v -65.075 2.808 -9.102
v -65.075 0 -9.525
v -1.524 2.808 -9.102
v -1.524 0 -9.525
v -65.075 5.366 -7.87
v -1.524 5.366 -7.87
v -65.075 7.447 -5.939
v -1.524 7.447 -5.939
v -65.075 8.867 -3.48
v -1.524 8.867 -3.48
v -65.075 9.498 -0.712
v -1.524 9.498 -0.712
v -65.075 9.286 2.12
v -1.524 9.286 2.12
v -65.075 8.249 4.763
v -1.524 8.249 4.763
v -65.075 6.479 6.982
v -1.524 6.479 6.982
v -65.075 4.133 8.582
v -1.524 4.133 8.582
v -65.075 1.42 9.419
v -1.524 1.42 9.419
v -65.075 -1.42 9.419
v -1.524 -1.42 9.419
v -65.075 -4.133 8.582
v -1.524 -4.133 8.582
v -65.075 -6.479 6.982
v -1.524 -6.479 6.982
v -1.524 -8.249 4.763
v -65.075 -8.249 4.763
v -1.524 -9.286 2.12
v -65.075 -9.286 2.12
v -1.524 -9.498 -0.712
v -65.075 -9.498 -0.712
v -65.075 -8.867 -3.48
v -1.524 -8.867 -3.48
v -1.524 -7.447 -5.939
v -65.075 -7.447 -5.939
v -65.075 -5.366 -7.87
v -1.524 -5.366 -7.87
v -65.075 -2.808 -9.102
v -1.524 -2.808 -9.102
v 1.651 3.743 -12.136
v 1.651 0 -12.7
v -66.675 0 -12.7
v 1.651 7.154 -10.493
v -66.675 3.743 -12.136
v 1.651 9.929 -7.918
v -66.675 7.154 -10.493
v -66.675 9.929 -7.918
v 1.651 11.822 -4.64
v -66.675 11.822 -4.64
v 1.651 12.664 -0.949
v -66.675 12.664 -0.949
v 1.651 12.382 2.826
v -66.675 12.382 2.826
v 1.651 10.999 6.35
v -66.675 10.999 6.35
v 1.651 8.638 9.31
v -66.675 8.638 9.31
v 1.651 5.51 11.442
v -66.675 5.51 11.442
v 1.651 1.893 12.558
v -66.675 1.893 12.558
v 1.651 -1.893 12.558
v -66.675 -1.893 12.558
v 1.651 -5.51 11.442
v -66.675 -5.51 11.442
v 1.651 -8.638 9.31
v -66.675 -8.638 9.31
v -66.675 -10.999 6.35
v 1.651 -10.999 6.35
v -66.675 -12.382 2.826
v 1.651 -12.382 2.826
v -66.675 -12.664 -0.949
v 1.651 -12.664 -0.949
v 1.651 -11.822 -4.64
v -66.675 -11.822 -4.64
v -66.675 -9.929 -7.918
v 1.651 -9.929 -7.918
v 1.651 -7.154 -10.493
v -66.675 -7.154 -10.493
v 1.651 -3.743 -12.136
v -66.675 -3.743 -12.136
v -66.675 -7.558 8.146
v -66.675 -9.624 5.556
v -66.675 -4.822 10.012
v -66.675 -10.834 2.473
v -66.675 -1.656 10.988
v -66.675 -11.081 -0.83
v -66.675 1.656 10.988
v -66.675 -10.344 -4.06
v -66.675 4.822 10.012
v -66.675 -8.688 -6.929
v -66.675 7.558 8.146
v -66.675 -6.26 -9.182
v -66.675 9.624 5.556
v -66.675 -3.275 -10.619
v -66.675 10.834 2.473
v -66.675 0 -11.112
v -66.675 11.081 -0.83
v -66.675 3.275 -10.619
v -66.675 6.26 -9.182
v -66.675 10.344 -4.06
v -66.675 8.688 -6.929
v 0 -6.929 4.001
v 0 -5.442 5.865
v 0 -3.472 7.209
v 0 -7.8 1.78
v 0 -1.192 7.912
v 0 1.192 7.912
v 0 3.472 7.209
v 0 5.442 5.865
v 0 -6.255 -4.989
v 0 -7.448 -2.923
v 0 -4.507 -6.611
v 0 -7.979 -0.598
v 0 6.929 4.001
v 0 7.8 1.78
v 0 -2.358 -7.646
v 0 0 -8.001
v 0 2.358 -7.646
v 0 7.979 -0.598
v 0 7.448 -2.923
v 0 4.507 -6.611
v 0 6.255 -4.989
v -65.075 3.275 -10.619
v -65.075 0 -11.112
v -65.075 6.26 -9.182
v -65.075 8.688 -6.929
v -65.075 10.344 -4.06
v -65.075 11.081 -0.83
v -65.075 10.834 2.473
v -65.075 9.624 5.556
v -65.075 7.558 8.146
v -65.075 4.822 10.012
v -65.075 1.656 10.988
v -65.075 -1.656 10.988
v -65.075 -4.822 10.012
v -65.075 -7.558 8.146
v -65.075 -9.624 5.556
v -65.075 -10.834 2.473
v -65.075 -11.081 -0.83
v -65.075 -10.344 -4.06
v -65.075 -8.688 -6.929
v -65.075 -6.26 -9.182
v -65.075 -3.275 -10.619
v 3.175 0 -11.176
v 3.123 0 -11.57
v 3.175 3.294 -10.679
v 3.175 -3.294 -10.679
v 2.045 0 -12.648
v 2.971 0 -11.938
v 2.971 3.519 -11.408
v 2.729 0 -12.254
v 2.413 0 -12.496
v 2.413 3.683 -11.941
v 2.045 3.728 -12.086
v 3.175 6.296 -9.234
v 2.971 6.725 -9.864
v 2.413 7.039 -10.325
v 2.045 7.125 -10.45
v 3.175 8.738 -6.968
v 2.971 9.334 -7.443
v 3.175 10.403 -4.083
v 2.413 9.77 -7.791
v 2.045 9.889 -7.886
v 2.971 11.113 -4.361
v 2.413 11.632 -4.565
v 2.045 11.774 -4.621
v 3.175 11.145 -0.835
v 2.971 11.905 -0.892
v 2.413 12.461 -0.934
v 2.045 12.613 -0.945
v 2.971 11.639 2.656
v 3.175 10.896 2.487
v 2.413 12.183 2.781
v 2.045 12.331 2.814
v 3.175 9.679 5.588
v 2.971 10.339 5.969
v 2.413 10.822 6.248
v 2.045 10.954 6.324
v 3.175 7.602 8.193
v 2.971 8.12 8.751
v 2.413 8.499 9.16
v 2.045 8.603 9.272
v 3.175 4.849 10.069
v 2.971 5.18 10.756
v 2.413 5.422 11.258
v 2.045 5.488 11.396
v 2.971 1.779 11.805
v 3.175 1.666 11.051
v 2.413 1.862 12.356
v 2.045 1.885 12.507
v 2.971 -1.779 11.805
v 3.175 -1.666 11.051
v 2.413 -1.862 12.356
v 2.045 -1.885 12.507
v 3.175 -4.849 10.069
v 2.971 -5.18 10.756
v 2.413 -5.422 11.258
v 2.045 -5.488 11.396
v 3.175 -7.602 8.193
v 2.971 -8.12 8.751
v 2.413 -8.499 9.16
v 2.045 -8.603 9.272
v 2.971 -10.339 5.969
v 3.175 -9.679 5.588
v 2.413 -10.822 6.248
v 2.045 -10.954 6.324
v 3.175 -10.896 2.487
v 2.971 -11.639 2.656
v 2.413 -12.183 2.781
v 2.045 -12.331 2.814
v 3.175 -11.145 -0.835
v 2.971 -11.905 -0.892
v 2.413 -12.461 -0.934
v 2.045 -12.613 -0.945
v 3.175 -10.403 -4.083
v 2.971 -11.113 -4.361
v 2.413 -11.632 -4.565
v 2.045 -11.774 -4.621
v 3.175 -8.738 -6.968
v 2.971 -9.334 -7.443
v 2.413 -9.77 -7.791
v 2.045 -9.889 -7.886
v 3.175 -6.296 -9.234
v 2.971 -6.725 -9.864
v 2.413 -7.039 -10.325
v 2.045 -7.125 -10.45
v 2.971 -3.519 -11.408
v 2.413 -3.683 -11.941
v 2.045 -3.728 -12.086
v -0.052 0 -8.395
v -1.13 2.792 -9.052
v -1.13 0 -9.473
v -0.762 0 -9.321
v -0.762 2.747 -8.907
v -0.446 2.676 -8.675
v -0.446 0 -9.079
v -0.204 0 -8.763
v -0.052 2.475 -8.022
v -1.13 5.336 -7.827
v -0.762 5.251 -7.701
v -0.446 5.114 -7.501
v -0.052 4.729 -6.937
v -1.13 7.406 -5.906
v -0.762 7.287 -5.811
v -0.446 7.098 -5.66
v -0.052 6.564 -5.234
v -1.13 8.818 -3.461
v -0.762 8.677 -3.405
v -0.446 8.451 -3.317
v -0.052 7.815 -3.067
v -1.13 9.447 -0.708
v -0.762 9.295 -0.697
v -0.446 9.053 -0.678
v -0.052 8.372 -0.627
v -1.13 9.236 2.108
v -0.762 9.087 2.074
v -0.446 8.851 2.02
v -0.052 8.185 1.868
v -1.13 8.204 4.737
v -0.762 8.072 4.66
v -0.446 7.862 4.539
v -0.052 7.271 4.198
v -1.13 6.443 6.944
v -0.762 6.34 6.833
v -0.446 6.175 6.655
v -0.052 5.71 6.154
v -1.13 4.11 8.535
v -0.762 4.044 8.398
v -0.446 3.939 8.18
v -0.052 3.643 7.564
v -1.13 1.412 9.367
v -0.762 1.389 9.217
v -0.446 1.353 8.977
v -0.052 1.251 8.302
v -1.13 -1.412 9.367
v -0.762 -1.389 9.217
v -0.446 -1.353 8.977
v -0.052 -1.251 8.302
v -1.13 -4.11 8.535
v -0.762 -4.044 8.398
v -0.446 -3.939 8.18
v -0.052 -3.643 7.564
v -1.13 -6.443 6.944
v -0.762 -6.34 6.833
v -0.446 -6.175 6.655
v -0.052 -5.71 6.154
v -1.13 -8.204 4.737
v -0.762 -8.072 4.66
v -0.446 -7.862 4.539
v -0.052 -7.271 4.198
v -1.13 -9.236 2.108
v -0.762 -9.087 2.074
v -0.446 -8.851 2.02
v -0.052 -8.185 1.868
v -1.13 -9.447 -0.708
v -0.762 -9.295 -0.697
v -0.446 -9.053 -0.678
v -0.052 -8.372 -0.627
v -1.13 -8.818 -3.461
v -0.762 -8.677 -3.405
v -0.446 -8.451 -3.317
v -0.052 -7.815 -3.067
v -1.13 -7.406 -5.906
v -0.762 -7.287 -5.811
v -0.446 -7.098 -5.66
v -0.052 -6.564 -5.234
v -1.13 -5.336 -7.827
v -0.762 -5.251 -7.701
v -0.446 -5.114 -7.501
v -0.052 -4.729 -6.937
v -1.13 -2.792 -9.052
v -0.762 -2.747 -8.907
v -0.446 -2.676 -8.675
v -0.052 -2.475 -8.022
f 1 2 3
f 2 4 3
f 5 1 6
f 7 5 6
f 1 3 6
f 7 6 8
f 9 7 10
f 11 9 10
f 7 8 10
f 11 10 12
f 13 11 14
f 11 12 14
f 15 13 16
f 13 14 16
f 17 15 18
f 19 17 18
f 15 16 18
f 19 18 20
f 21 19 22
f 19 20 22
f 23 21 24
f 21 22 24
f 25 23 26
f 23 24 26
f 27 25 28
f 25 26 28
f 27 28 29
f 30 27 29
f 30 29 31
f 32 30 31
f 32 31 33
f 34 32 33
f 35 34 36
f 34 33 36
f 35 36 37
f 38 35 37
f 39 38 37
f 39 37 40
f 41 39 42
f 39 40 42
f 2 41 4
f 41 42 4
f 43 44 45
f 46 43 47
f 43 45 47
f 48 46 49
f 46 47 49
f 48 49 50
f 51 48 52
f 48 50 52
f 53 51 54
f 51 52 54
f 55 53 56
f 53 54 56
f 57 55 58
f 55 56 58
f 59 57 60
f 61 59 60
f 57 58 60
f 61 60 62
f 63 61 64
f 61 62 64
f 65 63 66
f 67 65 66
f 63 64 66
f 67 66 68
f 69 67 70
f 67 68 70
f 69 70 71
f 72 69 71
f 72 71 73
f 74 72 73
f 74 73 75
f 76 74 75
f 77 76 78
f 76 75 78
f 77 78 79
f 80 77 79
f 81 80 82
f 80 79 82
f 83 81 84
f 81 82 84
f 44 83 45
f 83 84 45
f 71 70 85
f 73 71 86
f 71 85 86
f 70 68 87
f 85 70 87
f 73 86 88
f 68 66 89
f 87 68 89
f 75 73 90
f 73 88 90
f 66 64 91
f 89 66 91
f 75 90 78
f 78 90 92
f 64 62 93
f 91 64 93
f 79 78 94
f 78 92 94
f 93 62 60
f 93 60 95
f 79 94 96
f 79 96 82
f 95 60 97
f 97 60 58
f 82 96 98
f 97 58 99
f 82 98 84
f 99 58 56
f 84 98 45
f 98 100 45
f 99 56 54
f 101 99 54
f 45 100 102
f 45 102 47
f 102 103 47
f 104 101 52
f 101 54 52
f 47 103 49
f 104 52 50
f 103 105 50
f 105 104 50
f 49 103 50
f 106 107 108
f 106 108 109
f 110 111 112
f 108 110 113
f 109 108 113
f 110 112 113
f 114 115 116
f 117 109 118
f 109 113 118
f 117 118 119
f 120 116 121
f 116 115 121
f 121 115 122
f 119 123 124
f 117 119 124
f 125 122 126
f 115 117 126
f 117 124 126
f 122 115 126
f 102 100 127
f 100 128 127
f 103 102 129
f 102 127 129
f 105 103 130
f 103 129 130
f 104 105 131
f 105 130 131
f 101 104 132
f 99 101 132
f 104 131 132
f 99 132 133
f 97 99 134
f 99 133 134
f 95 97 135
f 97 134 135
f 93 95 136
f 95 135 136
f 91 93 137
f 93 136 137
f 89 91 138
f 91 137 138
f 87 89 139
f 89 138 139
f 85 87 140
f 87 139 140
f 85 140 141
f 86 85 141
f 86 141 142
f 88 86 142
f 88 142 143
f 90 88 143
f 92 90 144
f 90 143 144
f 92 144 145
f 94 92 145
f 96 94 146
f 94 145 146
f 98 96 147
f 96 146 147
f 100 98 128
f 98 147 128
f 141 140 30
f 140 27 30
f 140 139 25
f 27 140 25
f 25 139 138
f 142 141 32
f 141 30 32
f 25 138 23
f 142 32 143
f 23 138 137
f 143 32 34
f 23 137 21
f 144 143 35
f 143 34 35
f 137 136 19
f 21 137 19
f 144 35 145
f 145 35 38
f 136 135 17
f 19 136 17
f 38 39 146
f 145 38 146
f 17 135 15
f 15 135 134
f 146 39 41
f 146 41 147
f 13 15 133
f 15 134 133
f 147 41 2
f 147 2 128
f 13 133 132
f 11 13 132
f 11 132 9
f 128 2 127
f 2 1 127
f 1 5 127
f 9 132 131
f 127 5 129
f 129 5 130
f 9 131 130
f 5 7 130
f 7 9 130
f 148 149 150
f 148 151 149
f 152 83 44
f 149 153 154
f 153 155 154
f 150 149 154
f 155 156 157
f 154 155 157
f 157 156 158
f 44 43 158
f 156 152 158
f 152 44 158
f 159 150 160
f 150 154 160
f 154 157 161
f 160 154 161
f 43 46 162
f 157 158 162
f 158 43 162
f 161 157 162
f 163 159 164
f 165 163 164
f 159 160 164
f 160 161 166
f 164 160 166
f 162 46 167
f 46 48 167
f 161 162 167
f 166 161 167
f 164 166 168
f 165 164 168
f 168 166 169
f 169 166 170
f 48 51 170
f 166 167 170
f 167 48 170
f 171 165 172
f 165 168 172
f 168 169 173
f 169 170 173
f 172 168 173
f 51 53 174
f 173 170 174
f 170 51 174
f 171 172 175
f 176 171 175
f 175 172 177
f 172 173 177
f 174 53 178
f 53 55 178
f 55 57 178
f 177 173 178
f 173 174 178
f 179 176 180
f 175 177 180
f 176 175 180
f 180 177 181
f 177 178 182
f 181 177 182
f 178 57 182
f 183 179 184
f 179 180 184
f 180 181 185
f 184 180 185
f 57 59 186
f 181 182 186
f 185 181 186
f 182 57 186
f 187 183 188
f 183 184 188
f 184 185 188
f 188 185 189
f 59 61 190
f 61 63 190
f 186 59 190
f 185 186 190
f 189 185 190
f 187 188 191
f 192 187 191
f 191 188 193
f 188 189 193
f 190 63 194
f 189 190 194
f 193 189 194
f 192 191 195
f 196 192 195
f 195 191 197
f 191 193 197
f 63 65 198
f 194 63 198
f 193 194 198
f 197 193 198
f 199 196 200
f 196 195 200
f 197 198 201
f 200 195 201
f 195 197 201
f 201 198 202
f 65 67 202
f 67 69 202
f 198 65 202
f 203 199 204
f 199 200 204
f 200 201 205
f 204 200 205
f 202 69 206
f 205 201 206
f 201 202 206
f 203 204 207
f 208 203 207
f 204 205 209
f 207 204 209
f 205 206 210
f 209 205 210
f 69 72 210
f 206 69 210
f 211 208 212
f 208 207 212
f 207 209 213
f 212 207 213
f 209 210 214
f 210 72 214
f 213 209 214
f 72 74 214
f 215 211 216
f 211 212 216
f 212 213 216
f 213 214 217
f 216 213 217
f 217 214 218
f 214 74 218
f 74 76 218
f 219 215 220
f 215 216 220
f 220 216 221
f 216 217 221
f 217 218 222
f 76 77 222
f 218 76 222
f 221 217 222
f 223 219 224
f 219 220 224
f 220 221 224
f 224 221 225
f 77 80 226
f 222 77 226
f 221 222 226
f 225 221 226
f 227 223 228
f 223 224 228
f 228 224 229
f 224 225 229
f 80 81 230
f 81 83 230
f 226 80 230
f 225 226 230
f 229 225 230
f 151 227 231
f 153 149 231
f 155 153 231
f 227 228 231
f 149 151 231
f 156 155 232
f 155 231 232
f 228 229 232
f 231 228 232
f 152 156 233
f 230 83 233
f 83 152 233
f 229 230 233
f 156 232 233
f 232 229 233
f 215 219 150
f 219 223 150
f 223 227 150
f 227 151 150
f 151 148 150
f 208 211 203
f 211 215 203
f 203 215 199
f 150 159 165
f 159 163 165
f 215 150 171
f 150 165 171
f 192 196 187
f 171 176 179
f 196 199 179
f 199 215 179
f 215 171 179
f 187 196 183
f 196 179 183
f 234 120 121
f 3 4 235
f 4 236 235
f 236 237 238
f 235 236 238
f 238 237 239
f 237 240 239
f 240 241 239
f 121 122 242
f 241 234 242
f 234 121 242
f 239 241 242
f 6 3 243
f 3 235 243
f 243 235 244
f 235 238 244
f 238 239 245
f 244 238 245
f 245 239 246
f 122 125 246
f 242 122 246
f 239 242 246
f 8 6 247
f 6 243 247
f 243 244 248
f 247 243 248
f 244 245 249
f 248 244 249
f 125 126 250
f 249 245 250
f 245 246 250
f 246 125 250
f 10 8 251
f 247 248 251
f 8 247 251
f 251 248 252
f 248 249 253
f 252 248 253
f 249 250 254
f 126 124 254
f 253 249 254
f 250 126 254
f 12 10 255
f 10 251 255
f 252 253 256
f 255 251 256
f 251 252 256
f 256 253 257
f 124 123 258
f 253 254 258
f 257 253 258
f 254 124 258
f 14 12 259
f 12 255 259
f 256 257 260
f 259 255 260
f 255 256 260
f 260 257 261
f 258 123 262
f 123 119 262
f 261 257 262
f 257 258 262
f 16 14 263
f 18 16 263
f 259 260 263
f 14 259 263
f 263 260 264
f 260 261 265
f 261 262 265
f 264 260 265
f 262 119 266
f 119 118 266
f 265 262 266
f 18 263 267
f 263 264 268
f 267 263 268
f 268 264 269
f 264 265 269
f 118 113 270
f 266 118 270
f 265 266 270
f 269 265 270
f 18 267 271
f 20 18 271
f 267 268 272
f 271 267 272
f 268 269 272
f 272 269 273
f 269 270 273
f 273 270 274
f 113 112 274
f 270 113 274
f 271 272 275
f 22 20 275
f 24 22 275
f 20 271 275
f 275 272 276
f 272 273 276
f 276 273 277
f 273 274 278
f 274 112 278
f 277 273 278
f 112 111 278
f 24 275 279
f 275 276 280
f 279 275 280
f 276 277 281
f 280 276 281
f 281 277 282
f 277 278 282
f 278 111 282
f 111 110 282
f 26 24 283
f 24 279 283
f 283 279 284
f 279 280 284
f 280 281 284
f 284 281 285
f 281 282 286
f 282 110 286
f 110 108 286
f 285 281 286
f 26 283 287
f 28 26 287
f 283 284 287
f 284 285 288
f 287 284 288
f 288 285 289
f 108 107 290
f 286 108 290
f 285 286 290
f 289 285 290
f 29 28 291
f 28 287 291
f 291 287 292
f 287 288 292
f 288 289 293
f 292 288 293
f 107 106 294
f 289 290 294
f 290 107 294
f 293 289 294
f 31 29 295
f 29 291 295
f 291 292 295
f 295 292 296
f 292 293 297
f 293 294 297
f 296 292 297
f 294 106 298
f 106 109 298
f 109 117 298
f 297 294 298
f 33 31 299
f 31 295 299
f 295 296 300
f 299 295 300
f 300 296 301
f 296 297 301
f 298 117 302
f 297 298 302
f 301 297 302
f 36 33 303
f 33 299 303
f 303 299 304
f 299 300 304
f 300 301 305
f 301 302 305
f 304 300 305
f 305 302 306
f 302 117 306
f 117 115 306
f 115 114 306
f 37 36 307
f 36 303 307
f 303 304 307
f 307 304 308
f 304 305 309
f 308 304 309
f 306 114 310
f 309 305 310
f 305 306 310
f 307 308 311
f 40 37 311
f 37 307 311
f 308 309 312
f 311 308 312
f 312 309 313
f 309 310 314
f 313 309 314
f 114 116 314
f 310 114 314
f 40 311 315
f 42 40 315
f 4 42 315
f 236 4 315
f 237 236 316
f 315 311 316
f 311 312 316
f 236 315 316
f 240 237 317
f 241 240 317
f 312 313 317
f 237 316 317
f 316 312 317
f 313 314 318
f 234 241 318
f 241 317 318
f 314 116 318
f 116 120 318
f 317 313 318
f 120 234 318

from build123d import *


with BuildPart() as part:
    # Sketch1 → Revolve1 (revolve)
    with BuildSketch(Plane(origin=(0, 0, 0), x_dir=(1, 0, 0), z_dir=(0, 1, 0))):
        with BuildLine():
            Line((0, 0), (3.175, 0))
            Line((3.175, 0), (3.175, 11.176))
            ThreePointArc((3.175, 11.176), (2.728630735, 12.253630735), (1.651, 12.7))
            Line((1.651, 12.7), (-66.675, 12.7))
            Line((-66.675, 12.7), (-66.675, 11.1125))
            Line((-66.675, 11.1125), (-65.0748, 11.1125))
            Line((-65.0748, 11.1125), (-65.0748, 9.525))
            Line((-65.0748, 9.525), (-1.524, 9.525))
            ThreePointArc((-1.524, 9.525), (-0.446369265, 9.078630735), (0, 8.001))
            Line((0, 8.001), (0, 0))
        make_face()
    revolve(axis=Axis((0, 0, 0), (1, 0, 0)))


solid = part.part
